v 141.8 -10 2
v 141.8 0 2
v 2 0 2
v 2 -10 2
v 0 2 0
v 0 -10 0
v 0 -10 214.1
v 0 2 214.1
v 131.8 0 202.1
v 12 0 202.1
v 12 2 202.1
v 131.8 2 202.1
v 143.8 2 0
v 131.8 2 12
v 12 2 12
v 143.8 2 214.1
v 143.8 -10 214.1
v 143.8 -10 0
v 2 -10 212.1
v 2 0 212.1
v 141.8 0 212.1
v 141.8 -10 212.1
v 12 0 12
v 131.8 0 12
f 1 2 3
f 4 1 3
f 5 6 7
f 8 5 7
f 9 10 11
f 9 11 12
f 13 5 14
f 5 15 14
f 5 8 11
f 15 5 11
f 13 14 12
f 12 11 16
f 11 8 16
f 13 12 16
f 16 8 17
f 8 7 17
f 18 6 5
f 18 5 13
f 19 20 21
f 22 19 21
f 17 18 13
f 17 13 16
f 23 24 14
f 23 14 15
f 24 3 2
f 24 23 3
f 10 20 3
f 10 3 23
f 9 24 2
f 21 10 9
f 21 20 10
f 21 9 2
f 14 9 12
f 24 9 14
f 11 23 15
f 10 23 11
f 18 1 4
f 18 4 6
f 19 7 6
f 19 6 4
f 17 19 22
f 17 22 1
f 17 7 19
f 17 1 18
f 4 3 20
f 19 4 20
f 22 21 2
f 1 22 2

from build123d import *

# Parameters (mm, degrees)
F0_W     = 143.8
F0_H     = 214.1
F1_DEPTH = 10
F2_DEPTH = 2


with BuildPart() as f1:
    # F0 (on Front) → F1 (new body)
    with BuildSketch(Plane.XZ):
        with Locations((71.9, 107.05)):
            Rectangle(F0_W, F0_H)
        Polygon((2, 149.1), (2, 212.1), (78.8, 212.1), (141.8, 212.1), (141.8, 149.1), (141.8, 2), (78.8, 2), (2, 2), align=None, mode=Mode.SUBTRACT)
    extrude(amount=F1_DEPTH)

    # F0 (on Front) → F2 (join)
    with BuildSketch(Plane.XZ):
        with Locations((71.9, 107.05)):
            Rectangle(F0_W, F0_H)
        Polygon((2, 149.1), (2, 212.1), (78.8, 212.1), (141.8, 212.1), (141.8, 149.1), (141.8, 2), (78.8, 2), (2, 2), align=None, mode=Mode.SUBTRACT)
        Polygon((78.8, 212.1), (2, 212.1), (2, 149.1), (12, 149.1), (12, 202.1), (78.8, 202.1), align=None)
        Polygon((141.8, 212.1), (78.8, 212.1), (78.8, 202.1), (131.8, 202.1), (131.8, 149.1), (141.8, 149.1), align=None)
        Polygon((12, 149.1), (2, 149.1), (2, 2), (78.8, 2), (78.8, 12), (12, 12), align=None)
        Polygon((141.8, 2), (141.8, 149.1), (131.8, 149.1), (131.8, 12), (78.8, 12), (78.8, 2), align=None)
    extrude(amount=-F2_DEPTH)


solid = f1.part
